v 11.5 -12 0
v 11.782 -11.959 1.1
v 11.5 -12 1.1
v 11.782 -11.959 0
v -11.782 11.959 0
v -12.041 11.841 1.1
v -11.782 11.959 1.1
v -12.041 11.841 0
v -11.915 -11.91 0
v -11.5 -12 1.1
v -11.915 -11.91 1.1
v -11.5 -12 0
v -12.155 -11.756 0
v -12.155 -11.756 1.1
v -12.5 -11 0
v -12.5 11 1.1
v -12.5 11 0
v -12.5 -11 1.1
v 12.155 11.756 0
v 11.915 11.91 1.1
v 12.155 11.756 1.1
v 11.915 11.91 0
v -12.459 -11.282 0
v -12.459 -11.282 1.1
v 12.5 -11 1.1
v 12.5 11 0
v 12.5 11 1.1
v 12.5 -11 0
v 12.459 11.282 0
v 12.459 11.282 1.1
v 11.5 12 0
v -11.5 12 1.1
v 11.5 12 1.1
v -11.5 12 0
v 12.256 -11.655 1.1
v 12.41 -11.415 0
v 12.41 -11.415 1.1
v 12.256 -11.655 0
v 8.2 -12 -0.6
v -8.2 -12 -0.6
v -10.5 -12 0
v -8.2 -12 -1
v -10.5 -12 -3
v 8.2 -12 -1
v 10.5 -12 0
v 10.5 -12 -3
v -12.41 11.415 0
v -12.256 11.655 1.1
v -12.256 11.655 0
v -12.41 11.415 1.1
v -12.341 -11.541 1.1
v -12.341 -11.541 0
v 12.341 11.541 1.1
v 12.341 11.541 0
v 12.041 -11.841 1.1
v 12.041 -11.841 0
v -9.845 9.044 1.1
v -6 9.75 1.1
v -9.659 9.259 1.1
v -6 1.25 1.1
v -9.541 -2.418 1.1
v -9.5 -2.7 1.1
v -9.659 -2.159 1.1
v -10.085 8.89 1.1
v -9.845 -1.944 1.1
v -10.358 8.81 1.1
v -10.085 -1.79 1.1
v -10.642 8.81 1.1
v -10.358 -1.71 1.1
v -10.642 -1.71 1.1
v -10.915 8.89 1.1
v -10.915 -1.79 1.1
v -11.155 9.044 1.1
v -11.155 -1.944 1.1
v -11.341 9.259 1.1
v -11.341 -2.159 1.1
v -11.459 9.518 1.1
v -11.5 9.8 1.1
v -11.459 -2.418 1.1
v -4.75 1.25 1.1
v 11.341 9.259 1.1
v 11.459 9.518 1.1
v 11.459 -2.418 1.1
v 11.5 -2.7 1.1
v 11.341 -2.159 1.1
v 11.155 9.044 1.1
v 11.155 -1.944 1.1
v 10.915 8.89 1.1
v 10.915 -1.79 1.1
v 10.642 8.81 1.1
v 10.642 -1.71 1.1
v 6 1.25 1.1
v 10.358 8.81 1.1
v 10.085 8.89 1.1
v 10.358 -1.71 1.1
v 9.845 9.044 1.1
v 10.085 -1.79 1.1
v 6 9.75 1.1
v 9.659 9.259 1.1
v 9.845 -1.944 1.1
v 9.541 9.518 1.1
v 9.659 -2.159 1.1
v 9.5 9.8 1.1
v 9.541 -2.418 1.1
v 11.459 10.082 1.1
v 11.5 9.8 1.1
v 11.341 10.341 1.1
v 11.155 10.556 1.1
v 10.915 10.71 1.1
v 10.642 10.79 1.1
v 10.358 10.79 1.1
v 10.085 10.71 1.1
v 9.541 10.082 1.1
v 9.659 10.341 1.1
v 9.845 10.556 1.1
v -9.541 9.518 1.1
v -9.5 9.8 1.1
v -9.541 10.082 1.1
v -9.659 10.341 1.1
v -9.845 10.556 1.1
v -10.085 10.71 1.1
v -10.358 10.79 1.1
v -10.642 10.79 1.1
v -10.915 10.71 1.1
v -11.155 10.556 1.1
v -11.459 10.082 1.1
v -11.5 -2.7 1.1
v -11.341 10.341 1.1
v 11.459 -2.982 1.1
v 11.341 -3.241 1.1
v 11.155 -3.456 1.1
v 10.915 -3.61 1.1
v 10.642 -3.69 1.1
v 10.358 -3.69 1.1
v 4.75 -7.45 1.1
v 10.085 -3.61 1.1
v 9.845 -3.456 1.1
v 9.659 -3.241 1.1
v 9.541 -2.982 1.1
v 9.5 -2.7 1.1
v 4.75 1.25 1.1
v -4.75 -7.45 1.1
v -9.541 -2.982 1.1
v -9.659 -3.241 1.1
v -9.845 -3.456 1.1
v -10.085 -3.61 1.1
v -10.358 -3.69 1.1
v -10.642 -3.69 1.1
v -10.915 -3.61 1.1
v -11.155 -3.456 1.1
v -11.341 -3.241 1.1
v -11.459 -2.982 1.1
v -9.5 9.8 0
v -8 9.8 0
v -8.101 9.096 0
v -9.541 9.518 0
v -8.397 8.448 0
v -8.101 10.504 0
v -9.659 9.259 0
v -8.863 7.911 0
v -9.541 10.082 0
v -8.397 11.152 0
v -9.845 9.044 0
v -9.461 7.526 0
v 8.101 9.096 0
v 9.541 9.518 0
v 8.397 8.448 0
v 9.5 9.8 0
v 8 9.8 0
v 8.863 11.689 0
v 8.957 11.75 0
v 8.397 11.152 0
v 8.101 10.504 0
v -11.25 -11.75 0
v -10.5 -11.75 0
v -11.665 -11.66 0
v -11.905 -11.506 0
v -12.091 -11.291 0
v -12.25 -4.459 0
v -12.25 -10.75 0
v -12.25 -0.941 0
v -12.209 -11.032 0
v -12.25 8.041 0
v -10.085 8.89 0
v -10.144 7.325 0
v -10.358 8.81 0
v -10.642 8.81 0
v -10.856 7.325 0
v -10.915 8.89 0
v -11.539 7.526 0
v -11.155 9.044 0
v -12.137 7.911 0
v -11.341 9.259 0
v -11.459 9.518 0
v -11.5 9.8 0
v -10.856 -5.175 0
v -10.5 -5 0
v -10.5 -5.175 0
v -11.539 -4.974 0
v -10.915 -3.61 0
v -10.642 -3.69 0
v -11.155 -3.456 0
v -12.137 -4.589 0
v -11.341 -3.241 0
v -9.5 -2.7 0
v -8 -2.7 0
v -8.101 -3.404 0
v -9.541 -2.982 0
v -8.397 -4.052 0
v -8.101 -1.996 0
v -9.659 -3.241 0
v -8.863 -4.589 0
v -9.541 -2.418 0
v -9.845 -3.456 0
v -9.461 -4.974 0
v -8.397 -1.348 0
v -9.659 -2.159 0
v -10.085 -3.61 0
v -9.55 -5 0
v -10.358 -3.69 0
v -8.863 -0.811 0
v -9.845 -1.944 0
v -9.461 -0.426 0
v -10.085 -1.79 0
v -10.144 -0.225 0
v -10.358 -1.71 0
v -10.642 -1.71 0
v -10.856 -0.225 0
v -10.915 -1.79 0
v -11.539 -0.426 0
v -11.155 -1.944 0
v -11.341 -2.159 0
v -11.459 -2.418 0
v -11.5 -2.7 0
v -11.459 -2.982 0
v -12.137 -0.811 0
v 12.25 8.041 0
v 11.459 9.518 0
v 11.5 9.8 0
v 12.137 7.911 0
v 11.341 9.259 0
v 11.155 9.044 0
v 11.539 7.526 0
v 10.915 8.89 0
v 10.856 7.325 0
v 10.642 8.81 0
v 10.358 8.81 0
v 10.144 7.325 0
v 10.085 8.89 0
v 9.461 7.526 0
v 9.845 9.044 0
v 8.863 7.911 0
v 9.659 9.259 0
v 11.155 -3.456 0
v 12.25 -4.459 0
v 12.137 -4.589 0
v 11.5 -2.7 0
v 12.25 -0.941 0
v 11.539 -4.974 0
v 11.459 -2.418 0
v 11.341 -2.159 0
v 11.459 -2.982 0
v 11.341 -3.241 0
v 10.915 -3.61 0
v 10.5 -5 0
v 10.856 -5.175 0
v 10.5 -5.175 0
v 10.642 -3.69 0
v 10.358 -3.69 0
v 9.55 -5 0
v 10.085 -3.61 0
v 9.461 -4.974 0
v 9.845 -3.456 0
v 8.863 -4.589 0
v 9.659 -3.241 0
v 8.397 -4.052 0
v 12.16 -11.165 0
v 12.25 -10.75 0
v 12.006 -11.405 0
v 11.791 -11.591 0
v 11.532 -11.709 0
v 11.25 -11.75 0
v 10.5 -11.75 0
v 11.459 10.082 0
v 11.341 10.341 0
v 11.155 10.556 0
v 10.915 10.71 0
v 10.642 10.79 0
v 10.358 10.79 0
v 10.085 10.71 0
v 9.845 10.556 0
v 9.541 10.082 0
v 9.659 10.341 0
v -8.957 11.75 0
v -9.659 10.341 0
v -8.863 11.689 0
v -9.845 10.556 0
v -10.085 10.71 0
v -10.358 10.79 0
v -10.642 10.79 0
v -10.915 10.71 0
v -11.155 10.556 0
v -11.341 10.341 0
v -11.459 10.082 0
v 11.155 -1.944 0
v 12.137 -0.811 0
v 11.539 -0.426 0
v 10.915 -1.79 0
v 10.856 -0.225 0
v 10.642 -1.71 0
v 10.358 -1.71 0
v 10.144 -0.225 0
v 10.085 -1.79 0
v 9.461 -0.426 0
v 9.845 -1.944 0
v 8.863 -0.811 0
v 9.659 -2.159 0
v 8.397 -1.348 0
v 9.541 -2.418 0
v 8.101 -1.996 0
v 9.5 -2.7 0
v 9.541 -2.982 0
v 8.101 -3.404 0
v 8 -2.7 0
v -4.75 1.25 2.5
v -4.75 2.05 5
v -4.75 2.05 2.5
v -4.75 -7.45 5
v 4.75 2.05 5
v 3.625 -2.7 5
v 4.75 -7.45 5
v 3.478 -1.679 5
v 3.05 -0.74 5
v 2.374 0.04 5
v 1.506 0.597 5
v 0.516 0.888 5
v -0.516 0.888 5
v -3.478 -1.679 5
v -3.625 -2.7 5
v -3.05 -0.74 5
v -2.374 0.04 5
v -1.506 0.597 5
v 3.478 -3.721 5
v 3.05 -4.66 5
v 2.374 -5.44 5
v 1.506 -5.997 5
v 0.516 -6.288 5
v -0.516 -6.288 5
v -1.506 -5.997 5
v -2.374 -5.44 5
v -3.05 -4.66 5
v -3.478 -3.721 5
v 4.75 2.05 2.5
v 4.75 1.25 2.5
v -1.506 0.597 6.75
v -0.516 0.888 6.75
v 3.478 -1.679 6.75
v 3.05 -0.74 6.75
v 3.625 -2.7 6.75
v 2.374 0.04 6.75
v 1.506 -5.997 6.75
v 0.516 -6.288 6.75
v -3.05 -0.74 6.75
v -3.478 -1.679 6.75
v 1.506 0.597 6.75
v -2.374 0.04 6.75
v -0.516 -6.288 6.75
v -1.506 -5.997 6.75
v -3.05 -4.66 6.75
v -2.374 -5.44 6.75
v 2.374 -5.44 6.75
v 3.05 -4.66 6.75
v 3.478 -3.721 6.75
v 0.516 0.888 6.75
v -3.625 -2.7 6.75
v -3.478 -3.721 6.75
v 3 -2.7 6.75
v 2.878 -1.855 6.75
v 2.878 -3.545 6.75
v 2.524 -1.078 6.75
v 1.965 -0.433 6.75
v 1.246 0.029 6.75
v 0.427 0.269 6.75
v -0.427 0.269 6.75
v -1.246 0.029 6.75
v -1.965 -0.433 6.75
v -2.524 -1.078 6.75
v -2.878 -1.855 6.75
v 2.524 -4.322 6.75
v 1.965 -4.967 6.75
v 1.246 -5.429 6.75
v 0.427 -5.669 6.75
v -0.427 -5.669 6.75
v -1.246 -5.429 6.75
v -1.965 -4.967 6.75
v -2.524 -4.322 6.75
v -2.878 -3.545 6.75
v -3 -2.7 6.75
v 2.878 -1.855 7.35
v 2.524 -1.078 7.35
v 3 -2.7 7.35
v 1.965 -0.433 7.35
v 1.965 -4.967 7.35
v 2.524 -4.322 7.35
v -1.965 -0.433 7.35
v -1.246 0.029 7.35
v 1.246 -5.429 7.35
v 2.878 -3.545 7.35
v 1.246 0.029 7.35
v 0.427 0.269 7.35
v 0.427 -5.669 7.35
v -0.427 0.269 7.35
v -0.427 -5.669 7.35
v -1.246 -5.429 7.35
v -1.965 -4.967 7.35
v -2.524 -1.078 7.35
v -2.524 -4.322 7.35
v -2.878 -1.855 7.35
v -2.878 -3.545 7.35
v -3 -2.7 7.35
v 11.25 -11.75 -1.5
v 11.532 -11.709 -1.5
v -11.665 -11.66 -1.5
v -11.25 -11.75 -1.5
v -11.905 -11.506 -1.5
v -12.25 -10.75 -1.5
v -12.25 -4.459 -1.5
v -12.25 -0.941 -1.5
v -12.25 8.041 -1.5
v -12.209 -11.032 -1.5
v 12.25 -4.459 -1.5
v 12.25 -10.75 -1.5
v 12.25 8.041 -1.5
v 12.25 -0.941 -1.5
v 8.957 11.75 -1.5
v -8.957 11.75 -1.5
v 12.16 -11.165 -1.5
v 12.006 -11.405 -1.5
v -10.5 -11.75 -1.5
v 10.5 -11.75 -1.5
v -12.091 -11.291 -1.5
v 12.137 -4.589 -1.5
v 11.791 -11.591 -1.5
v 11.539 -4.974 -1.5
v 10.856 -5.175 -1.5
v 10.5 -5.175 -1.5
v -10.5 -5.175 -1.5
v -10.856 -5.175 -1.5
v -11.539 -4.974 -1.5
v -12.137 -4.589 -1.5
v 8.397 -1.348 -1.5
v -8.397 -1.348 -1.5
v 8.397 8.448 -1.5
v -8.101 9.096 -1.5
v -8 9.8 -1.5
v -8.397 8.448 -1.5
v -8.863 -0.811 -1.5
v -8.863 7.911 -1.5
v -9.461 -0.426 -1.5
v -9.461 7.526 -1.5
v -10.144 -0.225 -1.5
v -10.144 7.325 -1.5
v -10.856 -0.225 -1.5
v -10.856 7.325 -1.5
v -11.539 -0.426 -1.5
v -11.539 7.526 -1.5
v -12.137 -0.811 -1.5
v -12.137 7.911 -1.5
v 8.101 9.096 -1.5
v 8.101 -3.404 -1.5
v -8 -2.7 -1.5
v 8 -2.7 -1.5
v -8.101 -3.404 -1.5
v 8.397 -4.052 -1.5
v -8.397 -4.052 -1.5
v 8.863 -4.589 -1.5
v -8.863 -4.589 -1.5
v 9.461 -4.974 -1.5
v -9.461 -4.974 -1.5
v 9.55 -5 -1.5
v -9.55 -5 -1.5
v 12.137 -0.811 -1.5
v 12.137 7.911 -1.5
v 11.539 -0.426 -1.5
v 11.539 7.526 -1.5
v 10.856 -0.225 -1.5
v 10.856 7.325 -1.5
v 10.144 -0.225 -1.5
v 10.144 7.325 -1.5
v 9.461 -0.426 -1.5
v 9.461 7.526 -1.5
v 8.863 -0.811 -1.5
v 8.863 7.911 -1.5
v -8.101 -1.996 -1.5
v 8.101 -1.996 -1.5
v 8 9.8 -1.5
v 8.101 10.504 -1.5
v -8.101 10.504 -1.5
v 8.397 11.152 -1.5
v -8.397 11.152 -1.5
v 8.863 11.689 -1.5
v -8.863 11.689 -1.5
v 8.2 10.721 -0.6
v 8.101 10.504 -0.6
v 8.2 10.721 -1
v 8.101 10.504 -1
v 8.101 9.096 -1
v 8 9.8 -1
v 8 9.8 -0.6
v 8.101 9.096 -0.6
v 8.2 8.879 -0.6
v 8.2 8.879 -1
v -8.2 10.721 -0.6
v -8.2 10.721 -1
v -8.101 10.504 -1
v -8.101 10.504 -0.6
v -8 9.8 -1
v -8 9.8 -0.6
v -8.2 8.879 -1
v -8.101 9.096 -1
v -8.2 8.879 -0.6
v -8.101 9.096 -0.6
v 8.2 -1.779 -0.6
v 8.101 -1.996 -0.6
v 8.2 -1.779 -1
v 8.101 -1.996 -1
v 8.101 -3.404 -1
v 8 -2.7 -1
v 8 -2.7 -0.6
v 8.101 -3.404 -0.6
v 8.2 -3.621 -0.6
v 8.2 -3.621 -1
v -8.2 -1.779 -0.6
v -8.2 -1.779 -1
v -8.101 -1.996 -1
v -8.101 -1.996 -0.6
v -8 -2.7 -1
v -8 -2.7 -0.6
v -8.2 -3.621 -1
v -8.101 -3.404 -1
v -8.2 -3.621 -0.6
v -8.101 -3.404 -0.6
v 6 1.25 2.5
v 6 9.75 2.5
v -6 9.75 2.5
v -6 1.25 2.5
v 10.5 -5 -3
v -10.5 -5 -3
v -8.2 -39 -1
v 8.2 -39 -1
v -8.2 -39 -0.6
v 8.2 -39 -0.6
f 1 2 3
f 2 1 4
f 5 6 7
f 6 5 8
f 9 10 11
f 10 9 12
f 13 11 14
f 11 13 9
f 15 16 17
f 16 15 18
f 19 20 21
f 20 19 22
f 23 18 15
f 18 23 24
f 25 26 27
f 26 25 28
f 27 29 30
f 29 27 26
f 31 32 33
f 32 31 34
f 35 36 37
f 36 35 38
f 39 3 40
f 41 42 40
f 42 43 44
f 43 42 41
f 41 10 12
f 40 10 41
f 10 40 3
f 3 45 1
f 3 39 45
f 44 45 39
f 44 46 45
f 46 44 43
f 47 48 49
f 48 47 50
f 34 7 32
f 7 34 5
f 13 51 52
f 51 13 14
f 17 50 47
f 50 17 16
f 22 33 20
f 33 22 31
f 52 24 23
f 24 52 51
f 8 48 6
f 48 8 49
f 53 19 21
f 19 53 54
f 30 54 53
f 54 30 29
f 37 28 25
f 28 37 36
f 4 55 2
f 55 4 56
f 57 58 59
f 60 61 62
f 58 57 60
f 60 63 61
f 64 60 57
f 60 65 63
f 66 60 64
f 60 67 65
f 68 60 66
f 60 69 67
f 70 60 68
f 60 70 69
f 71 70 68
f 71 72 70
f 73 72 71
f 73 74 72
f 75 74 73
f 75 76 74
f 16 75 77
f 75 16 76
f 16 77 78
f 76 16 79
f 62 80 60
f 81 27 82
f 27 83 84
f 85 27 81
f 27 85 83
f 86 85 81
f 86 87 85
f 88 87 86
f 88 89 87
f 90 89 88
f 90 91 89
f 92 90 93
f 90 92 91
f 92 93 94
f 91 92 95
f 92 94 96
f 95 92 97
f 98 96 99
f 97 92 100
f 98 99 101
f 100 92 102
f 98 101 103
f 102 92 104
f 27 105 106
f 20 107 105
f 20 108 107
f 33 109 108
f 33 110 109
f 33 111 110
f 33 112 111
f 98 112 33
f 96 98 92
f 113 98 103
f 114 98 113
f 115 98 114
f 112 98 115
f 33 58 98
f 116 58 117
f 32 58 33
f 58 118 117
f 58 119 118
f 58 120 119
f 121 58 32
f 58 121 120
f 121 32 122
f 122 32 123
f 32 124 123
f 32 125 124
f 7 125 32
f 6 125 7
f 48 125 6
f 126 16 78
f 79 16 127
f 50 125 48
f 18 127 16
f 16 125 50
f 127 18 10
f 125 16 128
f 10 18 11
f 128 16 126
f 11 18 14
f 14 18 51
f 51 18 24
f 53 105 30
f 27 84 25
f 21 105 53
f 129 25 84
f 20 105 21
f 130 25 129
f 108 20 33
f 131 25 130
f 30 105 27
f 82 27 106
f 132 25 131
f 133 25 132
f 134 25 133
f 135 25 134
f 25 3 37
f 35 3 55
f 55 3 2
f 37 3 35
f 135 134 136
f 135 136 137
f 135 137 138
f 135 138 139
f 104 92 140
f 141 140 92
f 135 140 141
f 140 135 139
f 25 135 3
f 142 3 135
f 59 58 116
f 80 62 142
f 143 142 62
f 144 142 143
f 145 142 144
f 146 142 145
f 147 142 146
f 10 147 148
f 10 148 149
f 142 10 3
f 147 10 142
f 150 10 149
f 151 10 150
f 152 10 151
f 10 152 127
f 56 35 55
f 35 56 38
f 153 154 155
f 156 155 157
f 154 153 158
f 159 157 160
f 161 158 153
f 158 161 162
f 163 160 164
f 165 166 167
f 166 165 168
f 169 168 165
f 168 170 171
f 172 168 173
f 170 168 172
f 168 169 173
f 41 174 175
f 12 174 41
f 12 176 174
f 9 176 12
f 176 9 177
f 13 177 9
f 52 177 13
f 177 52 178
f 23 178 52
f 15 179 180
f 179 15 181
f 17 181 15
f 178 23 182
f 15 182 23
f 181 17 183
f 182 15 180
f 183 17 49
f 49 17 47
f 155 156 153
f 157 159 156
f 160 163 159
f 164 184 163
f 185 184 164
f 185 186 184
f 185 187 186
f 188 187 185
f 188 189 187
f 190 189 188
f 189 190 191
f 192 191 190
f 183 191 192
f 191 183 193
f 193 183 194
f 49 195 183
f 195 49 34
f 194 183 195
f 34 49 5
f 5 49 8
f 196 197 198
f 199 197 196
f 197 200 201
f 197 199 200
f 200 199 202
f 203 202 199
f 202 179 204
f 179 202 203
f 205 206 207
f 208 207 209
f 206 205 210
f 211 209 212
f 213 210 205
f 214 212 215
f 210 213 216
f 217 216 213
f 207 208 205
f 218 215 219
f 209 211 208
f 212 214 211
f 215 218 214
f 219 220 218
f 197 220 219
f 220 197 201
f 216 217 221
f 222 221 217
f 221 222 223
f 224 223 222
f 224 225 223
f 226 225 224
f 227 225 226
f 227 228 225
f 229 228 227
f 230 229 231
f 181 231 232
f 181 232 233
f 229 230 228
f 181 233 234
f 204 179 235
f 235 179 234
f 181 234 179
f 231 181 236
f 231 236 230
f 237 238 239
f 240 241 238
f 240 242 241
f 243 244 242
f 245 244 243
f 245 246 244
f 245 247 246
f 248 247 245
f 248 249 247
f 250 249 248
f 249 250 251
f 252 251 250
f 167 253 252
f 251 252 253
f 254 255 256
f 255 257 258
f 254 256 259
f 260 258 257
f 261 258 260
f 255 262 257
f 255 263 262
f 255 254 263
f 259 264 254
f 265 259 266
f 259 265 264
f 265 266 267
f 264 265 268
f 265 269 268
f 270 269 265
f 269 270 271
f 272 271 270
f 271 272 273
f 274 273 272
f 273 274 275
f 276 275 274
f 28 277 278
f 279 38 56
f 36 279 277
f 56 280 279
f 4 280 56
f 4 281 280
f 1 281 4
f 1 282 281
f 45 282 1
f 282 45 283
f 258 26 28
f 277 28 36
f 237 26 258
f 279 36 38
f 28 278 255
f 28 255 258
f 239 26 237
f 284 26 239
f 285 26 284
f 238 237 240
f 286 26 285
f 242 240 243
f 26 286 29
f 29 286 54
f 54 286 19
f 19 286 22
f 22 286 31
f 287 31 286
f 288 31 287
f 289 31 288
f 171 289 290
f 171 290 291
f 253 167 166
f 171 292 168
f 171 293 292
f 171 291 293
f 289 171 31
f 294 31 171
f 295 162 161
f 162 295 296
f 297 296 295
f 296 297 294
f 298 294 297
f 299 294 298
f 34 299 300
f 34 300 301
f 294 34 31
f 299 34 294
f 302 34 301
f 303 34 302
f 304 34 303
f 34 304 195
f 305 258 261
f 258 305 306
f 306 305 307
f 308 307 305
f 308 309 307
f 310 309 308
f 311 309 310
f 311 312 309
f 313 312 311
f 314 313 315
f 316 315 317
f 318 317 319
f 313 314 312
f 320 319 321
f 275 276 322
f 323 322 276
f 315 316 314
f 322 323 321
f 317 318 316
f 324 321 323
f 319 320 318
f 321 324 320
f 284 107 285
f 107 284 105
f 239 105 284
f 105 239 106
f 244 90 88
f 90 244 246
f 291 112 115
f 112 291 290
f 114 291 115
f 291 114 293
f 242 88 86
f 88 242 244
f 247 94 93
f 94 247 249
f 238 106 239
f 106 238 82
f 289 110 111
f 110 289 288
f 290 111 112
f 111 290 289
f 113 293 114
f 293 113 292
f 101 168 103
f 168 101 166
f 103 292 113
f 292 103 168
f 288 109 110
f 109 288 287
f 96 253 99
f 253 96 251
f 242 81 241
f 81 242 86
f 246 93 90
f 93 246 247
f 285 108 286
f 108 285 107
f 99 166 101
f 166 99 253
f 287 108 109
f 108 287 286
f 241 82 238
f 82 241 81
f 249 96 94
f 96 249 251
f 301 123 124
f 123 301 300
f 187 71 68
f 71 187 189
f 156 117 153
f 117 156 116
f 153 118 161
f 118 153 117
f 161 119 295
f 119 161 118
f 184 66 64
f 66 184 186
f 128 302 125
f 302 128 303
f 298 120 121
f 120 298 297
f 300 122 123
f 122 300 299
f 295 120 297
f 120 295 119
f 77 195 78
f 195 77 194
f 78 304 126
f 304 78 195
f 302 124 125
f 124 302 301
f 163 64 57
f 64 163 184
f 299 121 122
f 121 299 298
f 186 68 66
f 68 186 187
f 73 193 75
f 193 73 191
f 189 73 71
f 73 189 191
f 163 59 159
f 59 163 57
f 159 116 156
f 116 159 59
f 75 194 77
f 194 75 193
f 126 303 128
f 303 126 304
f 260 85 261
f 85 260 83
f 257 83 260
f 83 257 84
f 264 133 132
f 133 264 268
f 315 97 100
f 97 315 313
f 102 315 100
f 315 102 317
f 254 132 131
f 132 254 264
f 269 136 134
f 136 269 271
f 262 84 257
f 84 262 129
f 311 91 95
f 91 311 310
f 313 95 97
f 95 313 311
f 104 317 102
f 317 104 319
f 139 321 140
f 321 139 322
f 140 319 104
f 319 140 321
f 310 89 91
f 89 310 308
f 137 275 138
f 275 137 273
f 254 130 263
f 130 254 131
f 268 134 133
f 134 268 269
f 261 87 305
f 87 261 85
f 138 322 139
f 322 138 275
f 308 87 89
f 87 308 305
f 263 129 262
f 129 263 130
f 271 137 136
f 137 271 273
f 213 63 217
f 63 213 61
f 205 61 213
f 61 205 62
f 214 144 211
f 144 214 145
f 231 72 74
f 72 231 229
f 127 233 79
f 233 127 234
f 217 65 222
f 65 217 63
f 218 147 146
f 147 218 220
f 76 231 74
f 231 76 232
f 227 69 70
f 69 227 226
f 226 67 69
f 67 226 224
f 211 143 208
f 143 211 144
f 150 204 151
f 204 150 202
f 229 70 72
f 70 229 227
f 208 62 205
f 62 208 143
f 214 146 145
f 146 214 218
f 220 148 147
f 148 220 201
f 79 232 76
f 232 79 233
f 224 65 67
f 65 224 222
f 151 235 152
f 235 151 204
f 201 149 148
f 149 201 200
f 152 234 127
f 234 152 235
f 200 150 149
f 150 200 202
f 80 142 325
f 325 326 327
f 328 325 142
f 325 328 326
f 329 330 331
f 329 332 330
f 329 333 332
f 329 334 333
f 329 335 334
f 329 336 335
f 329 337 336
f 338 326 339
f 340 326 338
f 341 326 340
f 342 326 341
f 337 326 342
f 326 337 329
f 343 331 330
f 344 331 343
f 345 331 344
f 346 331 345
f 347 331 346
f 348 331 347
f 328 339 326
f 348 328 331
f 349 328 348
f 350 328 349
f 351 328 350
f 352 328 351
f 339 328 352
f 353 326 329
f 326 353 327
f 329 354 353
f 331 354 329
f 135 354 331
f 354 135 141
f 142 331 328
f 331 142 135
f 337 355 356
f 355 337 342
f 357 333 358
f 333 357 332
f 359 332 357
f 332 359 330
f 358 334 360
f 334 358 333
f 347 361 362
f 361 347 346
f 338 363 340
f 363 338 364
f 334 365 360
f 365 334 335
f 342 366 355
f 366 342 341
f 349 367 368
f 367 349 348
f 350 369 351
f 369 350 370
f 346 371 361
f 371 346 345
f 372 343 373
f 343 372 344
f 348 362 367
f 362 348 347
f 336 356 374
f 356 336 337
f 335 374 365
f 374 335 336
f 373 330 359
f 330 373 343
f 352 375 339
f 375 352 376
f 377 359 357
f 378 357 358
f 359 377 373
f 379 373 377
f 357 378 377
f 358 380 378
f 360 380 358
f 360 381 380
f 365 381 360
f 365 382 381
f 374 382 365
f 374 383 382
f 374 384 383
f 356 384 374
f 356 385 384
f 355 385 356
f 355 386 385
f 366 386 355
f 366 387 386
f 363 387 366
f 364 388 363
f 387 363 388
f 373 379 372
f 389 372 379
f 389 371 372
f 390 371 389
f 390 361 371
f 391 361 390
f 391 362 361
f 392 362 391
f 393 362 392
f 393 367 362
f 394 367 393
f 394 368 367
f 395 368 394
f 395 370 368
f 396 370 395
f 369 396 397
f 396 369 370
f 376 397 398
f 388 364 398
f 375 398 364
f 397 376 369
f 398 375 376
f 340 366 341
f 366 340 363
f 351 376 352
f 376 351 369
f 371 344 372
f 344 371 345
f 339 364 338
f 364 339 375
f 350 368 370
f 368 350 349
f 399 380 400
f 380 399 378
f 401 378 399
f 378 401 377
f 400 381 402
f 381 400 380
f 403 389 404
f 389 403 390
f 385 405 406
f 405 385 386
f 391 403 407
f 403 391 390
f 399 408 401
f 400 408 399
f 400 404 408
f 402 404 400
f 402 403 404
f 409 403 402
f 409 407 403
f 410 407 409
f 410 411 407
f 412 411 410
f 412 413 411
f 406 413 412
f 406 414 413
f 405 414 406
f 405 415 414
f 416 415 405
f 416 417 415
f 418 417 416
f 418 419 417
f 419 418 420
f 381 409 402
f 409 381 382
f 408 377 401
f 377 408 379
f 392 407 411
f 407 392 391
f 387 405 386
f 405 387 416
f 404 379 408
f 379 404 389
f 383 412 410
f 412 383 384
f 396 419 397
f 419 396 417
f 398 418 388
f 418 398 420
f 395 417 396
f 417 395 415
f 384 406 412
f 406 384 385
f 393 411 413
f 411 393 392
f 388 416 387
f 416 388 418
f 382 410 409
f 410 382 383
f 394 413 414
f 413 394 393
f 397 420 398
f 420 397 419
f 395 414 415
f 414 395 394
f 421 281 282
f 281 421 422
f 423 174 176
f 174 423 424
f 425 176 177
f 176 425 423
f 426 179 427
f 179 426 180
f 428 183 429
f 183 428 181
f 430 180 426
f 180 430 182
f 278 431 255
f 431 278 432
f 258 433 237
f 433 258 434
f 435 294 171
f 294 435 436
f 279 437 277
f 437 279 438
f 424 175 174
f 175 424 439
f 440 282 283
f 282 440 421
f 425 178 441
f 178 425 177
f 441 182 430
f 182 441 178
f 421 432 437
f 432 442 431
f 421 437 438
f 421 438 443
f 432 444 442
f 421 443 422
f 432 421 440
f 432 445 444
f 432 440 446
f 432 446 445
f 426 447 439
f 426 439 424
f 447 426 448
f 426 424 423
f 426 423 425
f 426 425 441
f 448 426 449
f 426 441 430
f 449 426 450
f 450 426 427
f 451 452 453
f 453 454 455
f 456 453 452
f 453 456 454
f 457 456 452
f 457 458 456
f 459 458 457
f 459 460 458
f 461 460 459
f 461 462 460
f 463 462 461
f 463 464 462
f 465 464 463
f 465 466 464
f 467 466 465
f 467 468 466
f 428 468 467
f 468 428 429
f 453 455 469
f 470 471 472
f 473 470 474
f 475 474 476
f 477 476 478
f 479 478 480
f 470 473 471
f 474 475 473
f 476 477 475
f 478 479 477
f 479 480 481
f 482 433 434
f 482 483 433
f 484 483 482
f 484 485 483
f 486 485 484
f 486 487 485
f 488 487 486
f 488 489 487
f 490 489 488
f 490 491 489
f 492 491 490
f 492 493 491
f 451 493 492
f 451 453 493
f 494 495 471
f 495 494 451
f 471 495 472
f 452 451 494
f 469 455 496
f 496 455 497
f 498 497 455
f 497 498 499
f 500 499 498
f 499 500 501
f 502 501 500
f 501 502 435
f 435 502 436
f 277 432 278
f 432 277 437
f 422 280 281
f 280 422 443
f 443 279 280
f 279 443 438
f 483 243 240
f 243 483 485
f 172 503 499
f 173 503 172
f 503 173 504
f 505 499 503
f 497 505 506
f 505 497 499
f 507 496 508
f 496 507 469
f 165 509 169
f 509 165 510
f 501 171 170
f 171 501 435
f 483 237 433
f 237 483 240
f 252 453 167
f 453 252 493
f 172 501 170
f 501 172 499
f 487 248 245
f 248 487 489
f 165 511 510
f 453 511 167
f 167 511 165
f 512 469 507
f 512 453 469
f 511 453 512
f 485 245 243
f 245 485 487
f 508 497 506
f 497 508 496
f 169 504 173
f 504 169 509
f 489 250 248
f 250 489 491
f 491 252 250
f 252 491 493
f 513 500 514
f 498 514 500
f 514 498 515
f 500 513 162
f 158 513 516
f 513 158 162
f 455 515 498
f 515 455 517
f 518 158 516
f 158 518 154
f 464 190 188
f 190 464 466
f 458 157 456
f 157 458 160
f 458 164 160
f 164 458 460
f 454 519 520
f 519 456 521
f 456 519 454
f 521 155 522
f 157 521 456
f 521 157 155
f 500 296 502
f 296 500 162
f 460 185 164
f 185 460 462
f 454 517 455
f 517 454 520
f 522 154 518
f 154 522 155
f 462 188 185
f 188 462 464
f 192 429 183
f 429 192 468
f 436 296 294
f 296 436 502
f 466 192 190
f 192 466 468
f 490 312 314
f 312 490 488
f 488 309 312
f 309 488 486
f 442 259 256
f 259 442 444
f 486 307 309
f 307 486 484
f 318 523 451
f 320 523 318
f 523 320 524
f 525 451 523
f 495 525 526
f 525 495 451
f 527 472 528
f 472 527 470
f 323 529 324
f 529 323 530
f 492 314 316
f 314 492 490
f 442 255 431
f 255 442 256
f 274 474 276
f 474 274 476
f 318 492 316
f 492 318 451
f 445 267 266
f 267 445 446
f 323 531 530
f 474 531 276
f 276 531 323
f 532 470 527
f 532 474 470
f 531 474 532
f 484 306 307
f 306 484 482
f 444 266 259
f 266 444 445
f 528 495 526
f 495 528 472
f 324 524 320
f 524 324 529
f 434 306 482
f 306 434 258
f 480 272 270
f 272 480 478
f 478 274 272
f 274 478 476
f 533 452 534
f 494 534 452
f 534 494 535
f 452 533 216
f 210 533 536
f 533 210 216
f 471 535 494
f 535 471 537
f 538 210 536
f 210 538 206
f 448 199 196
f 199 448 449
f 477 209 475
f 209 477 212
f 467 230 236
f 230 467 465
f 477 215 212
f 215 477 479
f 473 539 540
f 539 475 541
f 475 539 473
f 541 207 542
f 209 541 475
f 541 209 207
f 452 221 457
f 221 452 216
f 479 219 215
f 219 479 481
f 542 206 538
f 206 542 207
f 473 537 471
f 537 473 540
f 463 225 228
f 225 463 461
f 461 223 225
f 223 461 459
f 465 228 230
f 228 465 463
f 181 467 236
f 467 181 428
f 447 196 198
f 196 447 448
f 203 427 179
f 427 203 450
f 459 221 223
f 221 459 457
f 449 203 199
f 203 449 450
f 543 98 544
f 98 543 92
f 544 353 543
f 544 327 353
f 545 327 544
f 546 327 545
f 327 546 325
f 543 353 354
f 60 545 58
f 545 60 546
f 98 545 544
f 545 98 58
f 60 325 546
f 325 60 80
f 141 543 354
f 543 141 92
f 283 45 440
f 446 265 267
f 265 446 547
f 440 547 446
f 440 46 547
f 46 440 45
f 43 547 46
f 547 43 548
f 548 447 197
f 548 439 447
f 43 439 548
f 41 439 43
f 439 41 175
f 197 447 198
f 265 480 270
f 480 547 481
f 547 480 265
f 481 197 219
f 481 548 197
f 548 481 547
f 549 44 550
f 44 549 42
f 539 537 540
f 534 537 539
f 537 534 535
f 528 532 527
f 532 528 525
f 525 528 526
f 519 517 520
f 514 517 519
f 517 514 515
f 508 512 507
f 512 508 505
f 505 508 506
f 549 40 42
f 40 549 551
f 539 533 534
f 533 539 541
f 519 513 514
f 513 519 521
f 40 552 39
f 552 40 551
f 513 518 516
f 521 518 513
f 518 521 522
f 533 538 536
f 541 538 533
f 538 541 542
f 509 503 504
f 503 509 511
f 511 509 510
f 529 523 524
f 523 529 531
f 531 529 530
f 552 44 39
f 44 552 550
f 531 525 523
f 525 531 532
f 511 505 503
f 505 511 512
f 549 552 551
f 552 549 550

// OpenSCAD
// cam1
// models for the picamera v2.1

//----------------------------
module cam1(){
difference(){
    linear_extrude(height=1.1)
    offset(r=1,$fn=22)
    square([23,22],center=true);

    translate([10.5,9.8,0])
    cylinder(r=1,h=3,$fn=22);

    translate([-10.5,9.8,0])
    cylinder(r=1,h=3,$fn=22);

    translate([10.5,9.8-12.5,0])
    cylinder(r=1,h=3,$fn=22);

    translate([-10.5,9.8-12.5,0])
    cylinder(r=1,h=3,$fn=22);
}

// lens and box
translate([0,-2.7,0]){
    linear_extrude(height=5)
    square([9.5,9.5],center=true);
    cylinder(r=7.25/2,h=6.75,$fn=22);
    cylinder(r=6/2,h=6.75+0.6,$fn=22);
}

// cable off lens box
color("red")
translate([0,5.5,1.25])
cube([12,8.5,2.5],center=true);

// main cable
color("green")
translate([0,-12+3.5,-1.5])
cube([21,7,3],center=true);

// ribbon if needed
color("orange")
translate([0,-14,-1])
linear_extrude(height=0.4)
square([16.4,50],center=true);

// component clearance on backside
color("red")
translate([0,0,-1.5])
difference(){
    linear_extrude(height=1.5)
    offset(r=1,$fn=22)
    square([23-0.5,22-0.5],center=true);

    translate([10.5,9.8,0])
    cylinder(r=2.5,h=1.5,$fn=22);

    translate([-10.5,9.8,0])
    cylinder(r=2.5,h=1.5,$fn=22);

    translate([10.5,9.8-12.5,0])
    cylinder(r=2.5,h=1.5,$fn=22);

    translate([-10.5,9.8-12.5,0])
    cylinder(r=2.5,h=1.5,$fn=22);
}
} //---------- end module cam1 ----------

module cam1cut(tol=0.1){
difference(){
    linear_extrude(height=1.1+tol)
    offset(r=1,$fn=22)
    square([23+tol,22+tol],center=true);

    translate([10.5,9.8,0])
    cylinder(r=1-tol,h=3,$fn=22);

    translate([-10.5,9.8,0])
    cylinder(r=1-tol,h=3,$fn=22);

    translate([10.5,9.8-12.5,0])
    cylinder(r=1-tol,h=3,$fn=22);

    translate([-10.5,9.8-12.5,0])
    cylinder(r=1-tol,h=3,$fn=22);
}

// lens and box
translate([0,-2.7,0]){
    linear_extrude(height=5+tol)
    square([9.5+tol,9.5+tol],center=true);
    cylinder(r=7.25/2+tol/2,h=6.75+tol,$fn=22);
    cylinder(r=6/2+tol/2,h=6.75+0.6+tol,$fn=22);
}

// cable off lens box
translate([0,5.5,1.25])
cube([12+tol,8.5+tol,2.5+tol],center=true);

// main cable
color("green")
translate([0,-12+3.5,-1.5])
cube([21+tol,7+tol,3+tol],center=true);

// ribbon if needed
color("orange")
translate([0,-14,-1])
linear_extrude(height=0.4+tol)
square([16.4+tol,10+tol],center=true);

// component clearance on backside
color("red")
translate([0,0,-1.5-tol])
difference(){
    linear_extrude(height=1.5+tol)
    offset(r=1,$fn=22)
    square([23-0.5+tol,22-0.5+tol],center=true);

    translate([10.5,9.8,0])
    cylinder(r=2.5,h=1.5+tol,$fn=22);

    translate([-10.5,9.8,0])
    cylinder(r=2.5,h=1.5+tol,$fn=22);

    translate([10.5,9.8-12.5,0])
    cylinder(r=2.5,h=1.5+tol,$fn=22);

    translate([-10.5,9.8-12.5,0])
    cylinder(r=2.5,h=1.5+tol,$fn=22);
}
} //---------- end module cam1cut ----------

/*
difference(){
    cam1cut();
cam1();
}
*/
cam1();

//translate([35,0,0])
//cam1cut();
